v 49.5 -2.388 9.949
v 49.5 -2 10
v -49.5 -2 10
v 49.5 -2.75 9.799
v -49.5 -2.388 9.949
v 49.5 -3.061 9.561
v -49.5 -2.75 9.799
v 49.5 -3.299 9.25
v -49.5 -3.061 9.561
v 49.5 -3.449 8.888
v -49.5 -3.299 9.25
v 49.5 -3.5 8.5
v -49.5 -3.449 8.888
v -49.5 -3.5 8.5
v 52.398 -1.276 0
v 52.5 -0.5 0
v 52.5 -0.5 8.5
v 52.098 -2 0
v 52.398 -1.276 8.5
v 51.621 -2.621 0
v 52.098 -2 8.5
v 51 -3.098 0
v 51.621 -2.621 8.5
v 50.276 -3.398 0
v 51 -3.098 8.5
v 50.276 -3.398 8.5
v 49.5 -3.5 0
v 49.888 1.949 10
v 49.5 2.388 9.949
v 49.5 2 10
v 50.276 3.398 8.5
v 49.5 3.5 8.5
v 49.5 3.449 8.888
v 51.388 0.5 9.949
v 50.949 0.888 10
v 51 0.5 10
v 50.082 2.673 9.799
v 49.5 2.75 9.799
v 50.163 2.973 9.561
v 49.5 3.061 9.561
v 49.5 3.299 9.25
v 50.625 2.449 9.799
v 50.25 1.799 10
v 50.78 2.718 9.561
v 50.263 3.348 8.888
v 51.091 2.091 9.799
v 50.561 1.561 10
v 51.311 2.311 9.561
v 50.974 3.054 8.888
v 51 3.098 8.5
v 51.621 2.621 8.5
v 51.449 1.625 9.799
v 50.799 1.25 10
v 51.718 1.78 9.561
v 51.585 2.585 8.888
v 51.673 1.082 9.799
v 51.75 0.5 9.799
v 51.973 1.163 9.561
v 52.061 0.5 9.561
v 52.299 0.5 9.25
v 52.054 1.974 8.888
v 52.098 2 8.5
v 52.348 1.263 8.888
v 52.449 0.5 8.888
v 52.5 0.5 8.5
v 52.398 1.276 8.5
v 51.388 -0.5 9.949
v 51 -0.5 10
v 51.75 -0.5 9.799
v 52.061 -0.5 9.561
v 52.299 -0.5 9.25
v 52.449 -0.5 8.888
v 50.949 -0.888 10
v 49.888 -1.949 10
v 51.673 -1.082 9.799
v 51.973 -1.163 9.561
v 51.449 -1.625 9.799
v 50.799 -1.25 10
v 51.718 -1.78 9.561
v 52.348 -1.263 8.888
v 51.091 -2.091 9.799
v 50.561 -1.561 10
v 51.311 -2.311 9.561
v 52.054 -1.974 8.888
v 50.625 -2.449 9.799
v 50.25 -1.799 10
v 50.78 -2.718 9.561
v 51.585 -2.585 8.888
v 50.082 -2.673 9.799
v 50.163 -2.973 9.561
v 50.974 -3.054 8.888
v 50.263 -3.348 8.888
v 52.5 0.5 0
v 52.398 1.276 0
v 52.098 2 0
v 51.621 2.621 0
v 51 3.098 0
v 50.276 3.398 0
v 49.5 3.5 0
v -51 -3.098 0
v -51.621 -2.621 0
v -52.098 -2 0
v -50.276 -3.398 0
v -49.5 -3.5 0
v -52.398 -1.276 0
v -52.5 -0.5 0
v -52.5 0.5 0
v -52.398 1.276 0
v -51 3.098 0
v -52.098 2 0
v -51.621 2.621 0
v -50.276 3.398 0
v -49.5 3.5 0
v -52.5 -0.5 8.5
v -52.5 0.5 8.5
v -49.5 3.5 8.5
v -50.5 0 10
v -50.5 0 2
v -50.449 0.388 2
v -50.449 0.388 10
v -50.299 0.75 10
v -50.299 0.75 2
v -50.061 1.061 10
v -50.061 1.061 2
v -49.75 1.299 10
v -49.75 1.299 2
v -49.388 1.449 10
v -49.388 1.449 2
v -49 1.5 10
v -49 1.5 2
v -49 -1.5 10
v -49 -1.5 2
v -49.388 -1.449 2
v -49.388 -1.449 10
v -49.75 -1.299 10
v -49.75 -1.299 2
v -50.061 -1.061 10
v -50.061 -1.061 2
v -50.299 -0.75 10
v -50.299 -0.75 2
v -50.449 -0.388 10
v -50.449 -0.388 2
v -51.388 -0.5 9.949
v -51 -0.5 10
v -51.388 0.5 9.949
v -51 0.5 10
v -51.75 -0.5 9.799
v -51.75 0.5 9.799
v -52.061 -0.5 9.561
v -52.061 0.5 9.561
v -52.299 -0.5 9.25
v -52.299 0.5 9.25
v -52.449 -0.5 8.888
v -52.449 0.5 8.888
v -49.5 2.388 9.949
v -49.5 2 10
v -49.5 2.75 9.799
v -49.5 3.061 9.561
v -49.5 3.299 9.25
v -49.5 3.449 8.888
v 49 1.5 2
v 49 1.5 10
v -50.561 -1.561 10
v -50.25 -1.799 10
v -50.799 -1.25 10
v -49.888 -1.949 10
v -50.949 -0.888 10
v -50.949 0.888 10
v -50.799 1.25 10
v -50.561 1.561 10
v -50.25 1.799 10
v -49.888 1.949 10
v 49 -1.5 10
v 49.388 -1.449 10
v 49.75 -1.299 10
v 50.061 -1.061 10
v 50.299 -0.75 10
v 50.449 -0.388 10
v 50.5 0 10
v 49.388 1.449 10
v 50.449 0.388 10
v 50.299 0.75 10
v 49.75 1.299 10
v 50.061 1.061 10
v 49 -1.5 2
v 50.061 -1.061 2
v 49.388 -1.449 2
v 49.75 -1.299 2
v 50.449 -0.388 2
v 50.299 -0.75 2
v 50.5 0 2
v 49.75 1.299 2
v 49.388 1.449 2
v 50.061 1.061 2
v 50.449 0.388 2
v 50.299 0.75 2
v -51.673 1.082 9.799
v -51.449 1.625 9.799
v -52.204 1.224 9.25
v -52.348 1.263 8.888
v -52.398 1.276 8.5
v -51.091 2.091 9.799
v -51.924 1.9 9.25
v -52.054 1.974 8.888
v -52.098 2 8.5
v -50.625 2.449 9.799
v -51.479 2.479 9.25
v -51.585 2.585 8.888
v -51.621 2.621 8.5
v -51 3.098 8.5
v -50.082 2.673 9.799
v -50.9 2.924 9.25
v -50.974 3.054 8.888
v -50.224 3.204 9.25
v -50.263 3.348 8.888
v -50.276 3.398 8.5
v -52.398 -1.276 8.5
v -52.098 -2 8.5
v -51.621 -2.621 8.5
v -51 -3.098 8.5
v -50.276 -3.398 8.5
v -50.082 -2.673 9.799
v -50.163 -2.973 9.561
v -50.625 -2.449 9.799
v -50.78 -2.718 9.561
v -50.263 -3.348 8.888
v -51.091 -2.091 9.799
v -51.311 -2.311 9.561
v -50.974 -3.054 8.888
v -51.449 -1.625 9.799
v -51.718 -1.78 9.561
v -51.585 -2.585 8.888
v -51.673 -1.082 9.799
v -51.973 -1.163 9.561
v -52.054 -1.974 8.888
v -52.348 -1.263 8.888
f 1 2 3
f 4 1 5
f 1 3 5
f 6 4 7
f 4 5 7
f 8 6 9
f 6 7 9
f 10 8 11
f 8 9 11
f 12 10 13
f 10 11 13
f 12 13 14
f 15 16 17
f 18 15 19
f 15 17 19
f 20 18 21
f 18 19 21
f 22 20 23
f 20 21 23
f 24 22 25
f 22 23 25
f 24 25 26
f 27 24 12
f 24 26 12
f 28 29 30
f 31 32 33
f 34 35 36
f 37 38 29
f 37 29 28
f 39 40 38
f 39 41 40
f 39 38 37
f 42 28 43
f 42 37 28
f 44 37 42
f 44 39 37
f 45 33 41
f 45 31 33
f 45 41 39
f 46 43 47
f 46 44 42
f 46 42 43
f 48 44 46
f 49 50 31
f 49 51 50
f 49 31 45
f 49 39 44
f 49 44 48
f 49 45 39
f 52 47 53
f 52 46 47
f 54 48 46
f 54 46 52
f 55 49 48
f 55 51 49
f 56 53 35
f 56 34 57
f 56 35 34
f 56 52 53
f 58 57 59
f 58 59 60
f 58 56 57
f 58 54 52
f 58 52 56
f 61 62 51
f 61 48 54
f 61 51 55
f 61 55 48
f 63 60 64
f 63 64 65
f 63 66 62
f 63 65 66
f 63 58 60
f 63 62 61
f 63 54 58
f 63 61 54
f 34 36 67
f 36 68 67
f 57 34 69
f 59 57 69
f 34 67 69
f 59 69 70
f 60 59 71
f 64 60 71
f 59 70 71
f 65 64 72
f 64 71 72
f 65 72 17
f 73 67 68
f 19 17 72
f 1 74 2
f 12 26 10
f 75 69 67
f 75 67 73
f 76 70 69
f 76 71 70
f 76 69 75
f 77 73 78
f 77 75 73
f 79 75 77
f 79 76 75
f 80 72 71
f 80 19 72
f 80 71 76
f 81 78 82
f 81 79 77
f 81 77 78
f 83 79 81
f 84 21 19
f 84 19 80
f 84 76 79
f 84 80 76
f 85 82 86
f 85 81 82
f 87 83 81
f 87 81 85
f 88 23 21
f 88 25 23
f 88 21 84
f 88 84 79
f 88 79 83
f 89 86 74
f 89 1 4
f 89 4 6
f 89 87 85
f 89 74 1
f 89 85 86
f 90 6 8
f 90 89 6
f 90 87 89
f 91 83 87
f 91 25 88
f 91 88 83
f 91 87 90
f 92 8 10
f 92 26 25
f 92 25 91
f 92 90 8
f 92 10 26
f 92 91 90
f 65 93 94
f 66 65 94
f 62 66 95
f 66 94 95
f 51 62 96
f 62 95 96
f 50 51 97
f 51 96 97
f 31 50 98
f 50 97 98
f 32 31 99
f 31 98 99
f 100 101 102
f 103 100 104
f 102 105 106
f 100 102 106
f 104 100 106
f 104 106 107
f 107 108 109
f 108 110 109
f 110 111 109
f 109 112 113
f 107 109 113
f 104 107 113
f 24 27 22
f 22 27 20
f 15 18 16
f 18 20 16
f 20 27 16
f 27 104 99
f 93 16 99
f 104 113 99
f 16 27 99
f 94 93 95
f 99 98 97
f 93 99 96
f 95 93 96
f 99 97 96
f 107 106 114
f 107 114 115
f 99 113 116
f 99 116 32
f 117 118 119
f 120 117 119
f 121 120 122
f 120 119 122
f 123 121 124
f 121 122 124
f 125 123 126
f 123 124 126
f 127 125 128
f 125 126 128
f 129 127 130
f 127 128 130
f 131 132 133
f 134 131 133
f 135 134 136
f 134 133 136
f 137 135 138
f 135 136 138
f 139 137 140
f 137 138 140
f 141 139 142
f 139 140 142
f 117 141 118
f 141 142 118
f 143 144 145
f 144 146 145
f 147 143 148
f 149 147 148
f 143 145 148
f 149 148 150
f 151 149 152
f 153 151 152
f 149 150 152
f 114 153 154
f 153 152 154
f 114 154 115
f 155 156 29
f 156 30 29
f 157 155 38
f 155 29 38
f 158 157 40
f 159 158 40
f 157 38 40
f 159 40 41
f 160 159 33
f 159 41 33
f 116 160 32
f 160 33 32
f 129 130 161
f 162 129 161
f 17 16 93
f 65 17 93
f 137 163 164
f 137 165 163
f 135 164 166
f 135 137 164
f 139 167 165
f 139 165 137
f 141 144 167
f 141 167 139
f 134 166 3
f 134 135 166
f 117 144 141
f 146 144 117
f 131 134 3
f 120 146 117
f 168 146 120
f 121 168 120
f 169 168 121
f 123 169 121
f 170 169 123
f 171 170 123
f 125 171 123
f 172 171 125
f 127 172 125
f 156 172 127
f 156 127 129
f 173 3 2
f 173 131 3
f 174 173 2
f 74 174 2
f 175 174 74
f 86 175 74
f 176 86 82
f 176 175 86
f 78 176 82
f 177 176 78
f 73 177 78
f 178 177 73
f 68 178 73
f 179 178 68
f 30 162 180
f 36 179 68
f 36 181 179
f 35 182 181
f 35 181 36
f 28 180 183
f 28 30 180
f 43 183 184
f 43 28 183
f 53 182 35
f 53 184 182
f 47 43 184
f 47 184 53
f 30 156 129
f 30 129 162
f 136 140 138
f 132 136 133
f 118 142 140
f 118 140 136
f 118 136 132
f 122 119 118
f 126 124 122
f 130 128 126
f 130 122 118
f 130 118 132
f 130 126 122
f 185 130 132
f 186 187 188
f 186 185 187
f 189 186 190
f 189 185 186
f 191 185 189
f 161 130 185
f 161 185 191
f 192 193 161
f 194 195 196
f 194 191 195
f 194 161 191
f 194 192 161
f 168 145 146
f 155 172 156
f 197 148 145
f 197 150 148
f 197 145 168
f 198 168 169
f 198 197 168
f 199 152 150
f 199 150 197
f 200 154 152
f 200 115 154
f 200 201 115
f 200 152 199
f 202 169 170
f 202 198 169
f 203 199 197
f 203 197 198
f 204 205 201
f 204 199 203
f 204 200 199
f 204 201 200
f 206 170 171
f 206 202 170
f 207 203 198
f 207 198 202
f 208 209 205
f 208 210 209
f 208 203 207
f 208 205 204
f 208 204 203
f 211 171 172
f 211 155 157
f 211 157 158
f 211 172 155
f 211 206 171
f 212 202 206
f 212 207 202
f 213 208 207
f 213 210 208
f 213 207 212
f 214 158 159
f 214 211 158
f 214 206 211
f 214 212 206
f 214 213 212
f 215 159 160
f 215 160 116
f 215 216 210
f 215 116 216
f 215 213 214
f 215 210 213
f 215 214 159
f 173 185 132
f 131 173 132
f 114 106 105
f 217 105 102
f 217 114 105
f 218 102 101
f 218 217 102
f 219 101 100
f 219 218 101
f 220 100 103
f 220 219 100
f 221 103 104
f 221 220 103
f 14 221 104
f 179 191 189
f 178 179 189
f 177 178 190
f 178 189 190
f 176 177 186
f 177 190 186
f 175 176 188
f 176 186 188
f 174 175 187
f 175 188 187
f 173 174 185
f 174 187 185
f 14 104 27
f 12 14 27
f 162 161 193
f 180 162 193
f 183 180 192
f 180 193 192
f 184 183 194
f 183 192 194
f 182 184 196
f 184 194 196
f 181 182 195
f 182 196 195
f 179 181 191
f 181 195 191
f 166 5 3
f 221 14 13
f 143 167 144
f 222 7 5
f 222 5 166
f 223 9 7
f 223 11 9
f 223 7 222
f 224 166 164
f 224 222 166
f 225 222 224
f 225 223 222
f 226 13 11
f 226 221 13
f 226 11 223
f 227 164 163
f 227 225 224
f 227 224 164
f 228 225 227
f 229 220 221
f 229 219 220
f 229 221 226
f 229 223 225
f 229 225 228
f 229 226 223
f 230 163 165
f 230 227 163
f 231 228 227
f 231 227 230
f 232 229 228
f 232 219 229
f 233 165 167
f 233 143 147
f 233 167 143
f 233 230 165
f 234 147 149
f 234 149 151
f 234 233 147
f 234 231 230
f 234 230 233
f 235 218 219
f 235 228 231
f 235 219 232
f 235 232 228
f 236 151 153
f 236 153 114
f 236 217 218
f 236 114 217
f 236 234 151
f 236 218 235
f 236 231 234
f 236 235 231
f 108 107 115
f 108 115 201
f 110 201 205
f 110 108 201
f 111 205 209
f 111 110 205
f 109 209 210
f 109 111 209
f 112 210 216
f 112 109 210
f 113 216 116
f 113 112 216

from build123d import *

# Parameters (mm, degrees)
F0_W     = 105
F0_H     = 7
F1_DEPTH = 2
F2_DEPTH = 10
F3_R     = 3
F4_R     = 1.5


with BuildPart() as f1:
    # F0 (on Top) → F1 (new body)
    with BuildSketch(Plane.XY):
        Rectangle(F0_W, F0_H)
        with BuildLine():
            ThreePointArc((-50.5, 0), (-50.0606601718, 1.0606601718), (-49, 1.5))
            Line((-49, 1.5), (49, 1.5))
            ThreePointArc((49, 1.5), (50.0606601718, 1.0606601718), (50.5, 0))
            ThreePointArc((50.5, 0), (50.0606601718, -1.0606601718), (49, -1.5))
            Line((49, -1.5), (-49, -1.5))
            ThreePointArc((-49, -1.5), (-50.0606601718, -1.0606601718), (-50.5, 0))
        make_face(mode=Mode.SUBTRACT)
        with BuildLine():
            Line((49, 1.5), (-49, 1.5))
            ThreePointArc((-49, 1.5), (-50.0606601718, 1.0606601718), (-50.5, 0))
            ThreePointArc((-50.5, 0), (-50.0606601718, -1.0606601718), (-49, -1.5))
            Line((-49, -1.5), (49, -1.5))
            ThreePointArc((49, -1.5), (50.0606601718, -1.0606601718), (50.5, 0))
            ThreePointArc((50.5, 0), (50.0606601718, 1.0606601718), (49, 1.5))
        make_face()
    extrude(amount=F1_DEPTH)

    # F0 (on Top) → F2 (join)
    with BuildSketch(Plane.XY):
        Rectangle(F0_W, F0_H)
        with BuildLine():
            ThreePointArc((-50.5, 0), (-50.0606601718, 1.0606601718), (-49, 1.5))
            Line((-49, 1.5), (49, 1.5))
            ThreePointArc((49, 1.5), (50.0606601718, 1.0606601718), (50.5, 0))
            ThreePointArc((50.5, 0), (50.0606601718, -1.0606601718), (49, -1.5))
            Line((49, -1.5), (-49, -1.5))
            ThreePointArc((-49, -1.5), (-50.0606601718, -1.0606601718), (-50.5, 0))
        make_face(mode=Mode.SUBTRACT)
    extrude(amount=F2_DEPTH)

    # F3
    f3_edges = [f1.edges().sort_by_distance(p)[0] for p in [
        (-52.5, -3.5, 5),
        (52.5, -3.5, 5),
        (52.5, 3.5, 5),
        (-52.5, 3.5, 5),
    ]]
    fillet(f3_edges, radius=F3_R)

    # F4
    f4_edges = [f1.edges().sort_by_distance(p)[0] for p in [
        (0, 3.5, 10),
    ]]
    fillet(f4_edges, radius=F4_R)


solid = f1.part
